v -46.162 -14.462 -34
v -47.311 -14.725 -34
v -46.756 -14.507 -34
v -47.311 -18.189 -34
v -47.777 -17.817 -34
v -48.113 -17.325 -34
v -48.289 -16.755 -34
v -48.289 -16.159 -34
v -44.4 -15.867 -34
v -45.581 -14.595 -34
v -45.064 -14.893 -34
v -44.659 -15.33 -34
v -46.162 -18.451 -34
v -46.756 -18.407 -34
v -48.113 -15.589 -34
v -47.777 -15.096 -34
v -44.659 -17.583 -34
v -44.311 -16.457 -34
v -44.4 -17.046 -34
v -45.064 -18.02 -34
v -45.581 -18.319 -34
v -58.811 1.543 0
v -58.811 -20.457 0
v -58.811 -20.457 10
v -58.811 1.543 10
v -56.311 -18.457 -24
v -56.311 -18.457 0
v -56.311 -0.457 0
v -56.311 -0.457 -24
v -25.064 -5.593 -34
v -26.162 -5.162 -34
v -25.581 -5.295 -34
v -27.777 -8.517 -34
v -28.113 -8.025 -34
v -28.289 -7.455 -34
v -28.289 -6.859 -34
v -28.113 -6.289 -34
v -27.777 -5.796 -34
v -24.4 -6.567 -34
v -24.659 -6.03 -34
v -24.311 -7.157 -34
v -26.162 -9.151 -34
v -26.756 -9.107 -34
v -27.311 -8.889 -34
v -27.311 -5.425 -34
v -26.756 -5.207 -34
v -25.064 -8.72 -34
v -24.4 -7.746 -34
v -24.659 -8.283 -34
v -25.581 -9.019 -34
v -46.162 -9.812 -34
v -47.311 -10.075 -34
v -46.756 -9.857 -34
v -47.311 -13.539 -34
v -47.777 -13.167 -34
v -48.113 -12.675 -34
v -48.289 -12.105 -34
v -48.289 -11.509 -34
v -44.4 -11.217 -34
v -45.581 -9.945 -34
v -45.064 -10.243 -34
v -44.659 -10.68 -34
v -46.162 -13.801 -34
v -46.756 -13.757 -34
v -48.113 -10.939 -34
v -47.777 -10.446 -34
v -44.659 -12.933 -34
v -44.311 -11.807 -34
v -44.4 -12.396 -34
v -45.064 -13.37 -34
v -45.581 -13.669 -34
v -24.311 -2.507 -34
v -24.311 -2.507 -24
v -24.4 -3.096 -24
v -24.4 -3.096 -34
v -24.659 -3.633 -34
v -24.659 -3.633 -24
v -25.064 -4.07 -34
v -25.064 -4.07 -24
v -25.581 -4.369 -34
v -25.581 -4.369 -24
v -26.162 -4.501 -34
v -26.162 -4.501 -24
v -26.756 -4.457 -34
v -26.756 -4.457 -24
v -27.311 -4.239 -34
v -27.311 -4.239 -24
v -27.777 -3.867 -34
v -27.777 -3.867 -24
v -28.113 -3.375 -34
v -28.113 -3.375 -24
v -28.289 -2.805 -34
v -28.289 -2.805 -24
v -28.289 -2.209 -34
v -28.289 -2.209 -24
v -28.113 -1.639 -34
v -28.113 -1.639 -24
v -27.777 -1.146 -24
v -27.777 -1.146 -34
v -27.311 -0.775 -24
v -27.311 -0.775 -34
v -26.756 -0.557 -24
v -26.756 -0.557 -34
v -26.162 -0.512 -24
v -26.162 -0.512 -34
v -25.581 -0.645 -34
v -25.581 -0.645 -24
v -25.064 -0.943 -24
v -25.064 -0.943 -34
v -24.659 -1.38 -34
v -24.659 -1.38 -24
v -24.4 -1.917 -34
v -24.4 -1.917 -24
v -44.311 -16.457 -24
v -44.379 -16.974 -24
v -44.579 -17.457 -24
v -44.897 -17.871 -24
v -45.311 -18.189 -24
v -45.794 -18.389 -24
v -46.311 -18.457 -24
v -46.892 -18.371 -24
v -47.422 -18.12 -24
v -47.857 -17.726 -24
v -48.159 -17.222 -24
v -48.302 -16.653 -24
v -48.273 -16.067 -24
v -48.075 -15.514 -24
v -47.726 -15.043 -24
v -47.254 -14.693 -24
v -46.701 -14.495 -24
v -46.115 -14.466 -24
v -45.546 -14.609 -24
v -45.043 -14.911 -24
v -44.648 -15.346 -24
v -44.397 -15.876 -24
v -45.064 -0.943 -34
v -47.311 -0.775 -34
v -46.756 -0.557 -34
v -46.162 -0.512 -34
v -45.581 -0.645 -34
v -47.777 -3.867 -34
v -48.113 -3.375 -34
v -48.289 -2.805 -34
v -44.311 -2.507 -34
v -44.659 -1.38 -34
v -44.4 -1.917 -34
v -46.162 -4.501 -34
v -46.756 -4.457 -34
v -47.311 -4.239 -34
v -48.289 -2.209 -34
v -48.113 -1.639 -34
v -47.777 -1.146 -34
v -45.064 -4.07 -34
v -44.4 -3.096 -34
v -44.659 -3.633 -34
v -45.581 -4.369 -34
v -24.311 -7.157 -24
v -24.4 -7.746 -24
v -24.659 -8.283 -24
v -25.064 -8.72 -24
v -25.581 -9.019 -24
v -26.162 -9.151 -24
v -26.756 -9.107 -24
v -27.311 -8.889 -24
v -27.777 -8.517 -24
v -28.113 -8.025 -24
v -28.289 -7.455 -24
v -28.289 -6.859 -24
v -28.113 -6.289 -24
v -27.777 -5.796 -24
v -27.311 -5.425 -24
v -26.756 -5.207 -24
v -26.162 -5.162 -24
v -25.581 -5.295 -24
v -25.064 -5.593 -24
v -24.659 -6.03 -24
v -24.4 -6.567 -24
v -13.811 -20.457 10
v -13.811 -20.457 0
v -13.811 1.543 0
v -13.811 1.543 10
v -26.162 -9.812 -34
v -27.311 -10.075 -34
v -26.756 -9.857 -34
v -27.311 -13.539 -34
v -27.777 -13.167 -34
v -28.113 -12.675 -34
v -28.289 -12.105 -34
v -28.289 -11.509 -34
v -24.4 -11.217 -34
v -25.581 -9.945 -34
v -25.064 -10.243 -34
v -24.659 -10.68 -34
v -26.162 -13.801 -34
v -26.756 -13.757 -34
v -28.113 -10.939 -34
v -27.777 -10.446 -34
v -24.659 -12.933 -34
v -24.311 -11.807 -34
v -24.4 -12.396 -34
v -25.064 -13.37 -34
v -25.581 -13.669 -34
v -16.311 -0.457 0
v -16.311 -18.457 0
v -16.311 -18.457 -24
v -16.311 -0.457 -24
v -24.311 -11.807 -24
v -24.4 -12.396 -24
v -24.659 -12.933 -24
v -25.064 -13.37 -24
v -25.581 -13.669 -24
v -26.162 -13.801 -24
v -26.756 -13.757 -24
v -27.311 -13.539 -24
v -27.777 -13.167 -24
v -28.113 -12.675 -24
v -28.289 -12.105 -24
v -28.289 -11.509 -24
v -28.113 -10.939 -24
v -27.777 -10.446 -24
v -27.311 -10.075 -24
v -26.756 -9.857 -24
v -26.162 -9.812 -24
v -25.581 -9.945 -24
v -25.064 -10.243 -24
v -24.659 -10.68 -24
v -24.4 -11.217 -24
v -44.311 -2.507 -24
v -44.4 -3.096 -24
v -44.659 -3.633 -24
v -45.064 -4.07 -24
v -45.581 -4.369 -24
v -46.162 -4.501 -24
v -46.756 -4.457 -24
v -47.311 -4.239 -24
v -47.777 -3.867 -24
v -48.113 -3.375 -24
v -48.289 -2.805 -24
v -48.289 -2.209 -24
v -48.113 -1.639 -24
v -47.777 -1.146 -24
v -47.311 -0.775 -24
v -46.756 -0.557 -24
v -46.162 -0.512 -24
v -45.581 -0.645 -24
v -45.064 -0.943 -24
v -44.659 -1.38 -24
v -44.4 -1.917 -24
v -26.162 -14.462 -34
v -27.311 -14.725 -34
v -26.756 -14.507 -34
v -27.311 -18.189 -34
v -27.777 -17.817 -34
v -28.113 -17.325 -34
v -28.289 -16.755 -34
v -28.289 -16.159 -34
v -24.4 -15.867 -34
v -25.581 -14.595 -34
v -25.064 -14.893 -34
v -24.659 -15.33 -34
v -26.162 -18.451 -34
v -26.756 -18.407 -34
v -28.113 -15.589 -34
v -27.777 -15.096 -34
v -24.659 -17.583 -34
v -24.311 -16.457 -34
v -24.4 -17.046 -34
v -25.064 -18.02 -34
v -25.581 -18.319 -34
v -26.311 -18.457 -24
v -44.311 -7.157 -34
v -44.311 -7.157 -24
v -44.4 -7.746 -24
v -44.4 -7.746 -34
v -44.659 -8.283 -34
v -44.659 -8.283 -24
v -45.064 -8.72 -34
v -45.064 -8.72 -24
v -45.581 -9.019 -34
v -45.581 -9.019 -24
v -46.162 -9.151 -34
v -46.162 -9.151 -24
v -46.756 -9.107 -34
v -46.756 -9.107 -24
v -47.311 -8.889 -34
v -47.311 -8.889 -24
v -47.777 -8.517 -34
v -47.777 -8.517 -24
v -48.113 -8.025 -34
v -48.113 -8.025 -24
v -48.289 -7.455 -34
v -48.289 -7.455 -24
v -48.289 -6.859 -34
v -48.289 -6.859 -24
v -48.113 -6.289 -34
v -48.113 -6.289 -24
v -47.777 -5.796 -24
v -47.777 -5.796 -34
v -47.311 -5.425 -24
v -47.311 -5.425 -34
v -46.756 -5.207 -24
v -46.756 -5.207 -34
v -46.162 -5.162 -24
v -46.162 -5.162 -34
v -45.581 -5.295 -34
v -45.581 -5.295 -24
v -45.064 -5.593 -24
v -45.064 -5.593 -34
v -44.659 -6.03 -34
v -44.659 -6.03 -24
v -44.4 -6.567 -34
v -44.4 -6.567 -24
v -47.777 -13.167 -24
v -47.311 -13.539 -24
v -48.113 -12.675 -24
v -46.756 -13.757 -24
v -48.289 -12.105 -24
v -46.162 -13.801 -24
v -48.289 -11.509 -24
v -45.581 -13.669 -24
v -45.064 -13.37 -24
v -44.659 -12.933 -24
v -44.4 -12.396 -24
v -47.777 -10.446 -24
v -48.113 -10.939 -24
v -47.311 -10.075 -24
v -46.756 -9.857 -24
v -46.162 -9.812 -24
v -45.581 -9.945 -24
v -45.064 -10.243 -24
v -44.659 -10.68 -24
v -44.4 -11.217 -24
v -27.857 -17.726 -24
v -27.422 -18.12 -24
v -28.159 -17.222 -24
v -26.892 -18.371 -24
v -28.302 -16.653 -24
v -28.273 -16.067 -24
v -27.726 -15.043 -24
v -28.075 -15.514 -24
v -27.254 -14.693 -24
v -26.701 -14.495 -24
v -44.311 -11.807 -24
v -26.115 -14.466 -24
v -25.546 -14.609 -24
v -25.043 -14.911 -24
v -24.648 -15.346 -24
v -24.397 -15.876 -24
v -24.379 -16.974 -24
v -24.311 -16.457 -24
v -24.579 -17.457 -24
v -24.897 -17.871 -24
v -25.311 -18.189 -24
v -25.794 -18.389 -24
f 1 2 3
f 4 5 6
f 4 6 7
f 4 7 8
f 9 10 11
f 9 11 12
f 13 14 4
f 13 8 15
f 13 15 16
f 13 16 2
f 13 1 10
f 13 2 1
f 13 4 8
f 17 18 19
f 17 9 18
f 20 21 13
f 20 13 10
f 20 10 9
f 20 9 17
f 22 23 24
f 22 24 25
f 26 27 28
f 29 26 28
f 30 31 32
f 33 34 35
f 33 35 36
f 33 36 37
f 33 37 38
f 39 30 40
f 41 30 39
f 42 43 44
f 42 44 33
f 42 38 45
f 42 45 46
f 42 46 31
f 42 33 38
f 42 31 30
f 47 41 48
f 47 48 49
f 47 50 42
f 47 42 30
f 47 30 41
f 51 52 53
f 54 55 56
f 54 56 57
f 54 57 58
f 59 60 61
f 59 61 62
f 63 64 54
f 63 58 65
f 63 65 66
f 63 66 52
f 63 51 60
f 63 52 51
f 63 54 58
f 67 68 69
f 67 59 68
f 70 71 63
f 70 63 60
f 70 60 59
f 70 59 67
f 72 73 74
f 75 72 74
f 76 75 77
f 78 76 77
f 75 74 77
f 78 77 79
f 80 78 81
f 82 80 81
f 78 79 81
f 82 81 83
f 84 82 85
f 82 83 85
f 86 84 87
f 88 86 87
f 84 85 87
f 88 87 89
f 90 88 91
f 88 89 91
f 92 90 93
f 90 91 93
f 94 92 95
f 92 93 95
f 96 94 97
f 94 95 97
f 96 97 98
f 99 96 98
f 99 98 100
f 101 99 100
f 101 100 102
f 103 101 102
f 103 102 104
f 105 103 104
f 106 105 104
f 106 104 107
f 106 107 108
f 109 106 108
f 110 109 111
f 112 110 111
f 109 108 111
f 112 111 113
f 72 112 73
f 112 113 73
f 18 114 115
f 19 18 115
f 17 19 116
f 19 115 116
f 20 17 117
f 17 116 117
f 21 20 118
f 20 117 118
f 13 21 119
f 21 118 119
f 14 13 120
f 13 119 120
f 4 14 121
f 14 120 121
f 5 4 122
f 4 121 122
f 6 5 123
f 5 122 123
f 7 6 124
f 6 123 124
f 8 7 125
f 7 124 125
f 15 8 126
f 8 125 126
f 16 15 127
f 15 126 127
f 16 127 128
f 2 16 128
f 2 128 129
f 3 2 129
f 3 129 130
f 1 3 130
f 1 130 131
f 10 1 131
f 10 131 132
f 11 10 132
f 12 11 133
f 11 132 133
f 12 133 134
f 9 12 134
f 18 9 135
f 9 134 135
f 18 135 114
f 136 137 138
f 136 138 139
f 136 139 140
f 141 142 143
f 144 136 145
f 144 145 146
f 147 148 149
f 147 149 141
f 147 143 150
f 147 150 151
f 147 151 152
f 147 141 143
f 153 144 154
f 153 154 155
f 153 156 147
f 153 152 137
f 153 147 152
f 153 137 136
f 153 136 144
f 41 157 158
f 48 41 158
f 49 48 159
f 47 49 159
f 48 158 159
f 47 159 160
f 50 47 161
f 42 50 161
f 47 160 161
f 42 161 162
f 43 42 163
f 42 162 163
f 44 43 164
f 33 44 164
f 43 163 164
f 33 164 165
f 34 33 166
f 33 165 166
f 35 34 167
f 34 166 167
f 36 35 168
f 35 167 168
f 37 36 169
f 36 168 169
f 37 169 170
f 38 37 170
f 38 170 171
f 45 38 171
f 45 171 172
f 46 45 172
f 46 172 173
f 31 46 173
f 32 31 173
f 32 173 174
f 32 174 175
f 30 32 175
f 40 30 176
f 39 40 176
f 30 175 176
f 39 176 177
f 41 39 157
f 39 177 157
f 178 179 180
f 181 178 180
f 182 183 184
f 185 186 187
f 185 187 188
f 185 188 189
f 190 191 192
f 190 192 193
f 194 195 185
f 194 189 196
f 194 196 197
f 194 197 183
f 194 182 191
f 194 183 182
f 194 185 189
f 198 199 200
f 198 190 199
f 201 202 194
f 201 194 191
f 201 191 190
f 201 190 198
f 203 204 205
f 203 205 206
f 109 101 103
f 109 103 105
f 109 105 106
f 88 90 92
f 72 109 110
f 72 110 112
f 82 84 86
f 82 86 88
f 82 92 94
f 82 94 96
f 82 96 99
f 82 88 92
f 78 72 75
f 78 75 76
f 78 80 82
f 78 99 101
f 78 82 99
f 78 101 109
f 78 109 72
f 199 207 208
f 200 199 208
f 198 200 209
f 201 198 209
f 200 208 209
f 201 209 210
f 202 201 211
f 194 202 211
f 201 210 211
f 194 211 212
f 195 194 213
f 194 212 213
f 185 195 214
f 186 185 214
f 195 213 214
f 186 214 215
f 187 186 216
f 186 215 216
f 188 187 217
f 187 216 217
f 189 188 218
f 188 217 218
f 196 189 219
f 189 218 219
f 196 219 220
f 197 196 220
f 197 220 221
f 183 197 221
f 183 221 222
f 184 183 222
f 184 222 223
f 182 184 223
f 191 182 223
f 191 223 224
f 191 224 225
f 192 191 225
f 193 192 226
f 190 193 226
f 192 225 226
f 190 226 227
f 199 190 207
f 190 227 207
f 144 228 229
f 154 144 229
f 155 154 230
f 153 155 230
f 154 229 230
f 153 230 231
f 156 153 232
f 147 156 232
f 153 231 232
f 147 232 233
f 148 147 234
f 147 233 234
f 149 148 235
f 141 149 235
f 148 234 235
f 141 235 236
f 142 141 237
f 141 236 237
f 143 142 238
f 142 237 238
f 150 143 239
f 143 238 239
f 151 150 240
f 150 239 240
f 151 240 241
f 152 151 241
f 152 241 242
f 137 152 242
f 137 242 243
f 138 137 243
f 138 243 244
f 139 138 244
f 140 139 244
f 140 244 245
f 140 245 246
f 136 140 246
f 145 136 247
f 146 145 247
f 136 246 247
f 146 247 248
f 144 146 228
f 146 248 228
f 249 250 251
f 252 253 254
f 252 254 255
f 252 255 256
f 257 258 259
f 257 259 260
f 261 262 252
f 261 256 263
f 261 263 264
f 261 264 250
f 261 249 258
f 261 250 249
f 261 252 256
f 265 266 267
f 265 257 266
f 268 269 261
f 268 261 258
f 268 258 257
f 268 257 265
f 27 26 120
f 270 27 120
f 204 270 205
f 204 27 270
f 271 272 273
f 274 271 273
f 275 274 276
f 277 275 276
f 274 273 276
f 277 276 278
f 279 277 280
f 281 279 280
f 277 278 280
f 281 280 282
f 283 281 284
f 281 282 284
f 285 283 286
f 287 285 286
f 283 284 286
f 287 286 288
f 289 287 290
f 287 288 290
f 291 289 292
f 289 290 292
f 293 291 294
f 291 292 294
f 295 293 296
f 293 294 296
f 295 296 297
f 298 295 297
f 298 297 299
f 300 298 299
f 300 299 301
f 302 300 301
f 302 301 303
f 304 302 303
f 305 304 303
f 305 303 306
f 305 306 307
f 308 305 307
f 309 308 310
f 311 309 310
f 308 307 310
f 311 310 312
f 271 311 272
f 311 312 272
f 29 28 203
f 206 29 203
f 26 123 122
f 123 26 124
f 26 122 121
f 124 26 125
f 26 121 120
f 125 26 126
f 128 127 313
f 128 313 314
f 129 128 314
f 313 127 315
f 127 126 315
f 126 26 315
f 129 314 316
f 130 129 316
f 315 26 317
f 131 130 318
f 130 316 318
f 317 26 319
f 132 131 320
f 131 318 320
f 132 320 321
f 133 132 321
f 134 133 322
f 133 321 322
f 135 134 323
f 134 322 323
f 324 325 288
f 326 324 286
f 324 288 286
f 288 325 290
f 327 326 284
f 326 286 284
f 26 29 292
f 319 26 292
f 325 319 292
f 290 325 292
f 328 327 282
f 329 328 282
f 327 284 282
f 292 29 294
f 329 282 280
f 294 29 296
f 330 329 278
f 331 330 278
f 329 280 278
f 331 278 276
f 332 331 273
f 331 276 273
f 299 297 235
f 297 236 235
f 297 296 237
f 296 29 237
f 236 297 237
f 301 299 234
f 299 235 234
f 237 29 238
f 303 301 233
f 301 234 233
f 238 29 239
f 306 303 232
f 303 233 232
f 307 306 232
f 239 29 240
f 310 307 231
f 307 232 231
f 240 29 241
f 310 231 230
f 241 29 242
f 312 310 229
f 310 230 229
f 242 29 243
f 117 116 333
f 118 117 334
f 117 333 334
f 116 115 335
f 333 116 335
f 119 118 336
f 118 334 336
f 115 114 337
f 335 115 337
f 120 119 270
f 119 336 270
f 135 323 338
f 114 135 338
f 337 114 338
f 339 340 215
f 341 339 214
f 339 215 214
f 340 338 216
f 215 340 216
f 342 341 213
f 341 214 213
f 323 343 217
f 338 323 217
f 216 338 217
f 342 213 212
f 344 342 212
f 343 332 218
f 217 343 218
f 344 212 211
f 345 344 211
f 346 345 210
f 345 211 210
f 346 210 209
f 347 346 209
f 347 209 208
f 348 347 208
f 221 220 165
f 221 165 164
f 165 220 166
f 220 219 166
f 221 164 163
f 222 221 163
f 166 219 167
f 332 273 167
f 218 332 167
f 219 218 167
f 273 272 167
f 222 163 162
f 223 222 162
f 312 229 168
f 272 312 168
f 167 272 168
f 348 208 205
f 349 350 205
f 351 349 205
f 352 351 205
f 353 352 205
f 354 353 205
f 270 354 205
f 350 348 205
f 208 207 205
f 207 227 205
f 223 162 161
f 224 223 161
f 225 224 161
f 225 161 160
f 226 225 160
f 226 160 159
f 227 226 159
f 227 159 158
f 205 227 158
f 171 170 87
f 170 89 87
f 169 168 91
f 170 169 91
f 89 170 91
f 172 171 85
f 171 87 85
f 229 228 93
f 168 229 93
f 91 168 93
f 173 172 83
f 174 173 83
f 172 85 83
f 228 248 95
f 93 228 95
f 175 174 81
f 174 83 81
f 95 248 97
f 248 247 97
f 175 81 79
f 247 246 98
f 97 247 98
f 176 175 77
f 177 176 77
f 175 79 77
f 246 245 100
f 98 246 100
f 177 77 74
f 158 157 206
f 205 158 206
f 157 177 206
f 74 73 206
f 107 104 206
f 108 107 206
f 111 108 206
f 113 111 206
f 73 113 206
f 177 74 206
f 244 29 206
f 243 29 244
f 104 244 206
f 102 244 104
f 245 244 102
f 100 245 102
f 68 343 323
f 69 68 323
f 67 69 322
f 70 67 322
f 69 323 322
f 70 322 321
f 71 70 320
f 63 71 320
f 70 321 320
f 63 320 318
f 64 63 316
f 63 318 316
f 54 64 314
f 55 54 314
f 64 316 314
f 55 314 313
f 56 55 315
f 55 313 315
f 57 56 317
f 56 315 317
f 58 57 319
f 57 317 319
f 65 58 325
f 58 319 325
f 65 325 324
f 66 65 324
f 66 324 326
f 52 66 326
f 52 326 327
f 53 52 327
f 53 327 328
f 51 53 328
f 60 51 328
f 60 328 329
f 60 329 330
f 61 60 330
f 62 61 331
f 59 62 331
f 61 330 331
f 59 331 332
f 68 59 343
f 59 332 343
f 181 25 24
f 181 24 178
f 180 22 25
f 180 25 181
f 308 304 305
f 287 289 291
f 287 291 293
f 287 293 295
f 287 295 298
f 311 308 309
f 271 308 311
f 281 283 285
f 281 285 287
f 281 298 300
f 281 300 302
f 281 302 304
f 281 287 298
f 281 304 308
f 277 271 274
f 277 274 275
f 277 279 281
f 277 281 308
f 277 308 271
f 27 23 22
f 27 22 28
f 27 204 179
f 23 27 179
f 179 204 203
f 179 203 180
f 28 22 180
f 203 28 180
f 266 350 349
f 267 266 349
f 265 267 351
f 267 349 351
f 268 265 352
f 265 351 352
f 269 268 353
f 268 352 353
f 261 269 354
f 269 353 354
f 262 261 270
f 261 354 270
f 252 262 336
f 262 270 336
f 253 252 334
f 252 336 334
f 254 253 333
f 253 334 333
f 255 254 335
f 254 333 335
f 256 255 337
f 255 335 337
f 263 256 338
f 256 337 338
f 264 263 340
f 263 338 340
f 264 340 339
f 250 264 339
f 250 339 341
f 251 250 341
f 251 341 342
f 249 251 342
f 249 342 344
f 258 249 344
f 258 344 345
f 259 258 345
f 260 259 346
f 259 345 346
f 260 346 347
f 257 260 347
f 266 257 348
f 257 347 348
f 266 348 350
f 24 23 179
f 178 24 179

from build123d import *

# Parameters (mm, degrees)
F0_W     = 45
F0_H     = 22
F0_W_2   = 40
F0_H_2   = 18
F1_DEPTH = 10
F2_DEPTH = 24
F3_R     = 2
F4_DEPTH = 10


with BuildPart() as f1:
    # F0 (on Top) → F1 (new body)
    with BuildSketch(Plane.XY):
        with Locations((-36.311314, -9.456807)):
            Rectangle(F0_W, F0_H)
        with Locations((-36.311314, -9.456807)):
            Rectangle(F0_W_2, F0_H_2, mode=Mode.SUBTRACT)
        with Locations((-36.311314, -9.456807)):
            Rectangle(F0_W_2, F0_H_2)
    extrude(amount=F1_DEPTH)

    # F0 (on Top) → F2 (join)
    with BuildSketch(Plane.XY):
        with Locations((-36.311314, -9.456807)):
            Rectangle(F0_W_2, F0_H_2)
    extrude(amount=-F2_DEPTH)

    # F3 (on face) → F4 (join)
    with BuildSketch(Plane(origin=(0, 0, -24), x_dir=(1, 0, 0), z_dir=(0, 0, -1))):
        with Locations((-46.311314, 16.456807)):
            Circle(F3_R)
        with Locations((-46.311314, 11.806807)):
            Circle(F3_R)
        with Locations((-46.311314, 7.156807)):
            Circle(F3_R)
        with Locations((-46.311314, 2.506807)):
            Circle(F3_R)
        with Locations((-26.311314, 16.456807)):
            Circle(F3_R)
        with Locations((-26.311314, 11.806807)):
            Circle(F3_R)
        with Locations((-26.311314, 7.156807)):
            Circle(F3_R)
        with Locations((-26.311314, 2.506807)):
            Circle(F3_R)
    extrude(amount=F4_DEPTH)


solid = f1.part
